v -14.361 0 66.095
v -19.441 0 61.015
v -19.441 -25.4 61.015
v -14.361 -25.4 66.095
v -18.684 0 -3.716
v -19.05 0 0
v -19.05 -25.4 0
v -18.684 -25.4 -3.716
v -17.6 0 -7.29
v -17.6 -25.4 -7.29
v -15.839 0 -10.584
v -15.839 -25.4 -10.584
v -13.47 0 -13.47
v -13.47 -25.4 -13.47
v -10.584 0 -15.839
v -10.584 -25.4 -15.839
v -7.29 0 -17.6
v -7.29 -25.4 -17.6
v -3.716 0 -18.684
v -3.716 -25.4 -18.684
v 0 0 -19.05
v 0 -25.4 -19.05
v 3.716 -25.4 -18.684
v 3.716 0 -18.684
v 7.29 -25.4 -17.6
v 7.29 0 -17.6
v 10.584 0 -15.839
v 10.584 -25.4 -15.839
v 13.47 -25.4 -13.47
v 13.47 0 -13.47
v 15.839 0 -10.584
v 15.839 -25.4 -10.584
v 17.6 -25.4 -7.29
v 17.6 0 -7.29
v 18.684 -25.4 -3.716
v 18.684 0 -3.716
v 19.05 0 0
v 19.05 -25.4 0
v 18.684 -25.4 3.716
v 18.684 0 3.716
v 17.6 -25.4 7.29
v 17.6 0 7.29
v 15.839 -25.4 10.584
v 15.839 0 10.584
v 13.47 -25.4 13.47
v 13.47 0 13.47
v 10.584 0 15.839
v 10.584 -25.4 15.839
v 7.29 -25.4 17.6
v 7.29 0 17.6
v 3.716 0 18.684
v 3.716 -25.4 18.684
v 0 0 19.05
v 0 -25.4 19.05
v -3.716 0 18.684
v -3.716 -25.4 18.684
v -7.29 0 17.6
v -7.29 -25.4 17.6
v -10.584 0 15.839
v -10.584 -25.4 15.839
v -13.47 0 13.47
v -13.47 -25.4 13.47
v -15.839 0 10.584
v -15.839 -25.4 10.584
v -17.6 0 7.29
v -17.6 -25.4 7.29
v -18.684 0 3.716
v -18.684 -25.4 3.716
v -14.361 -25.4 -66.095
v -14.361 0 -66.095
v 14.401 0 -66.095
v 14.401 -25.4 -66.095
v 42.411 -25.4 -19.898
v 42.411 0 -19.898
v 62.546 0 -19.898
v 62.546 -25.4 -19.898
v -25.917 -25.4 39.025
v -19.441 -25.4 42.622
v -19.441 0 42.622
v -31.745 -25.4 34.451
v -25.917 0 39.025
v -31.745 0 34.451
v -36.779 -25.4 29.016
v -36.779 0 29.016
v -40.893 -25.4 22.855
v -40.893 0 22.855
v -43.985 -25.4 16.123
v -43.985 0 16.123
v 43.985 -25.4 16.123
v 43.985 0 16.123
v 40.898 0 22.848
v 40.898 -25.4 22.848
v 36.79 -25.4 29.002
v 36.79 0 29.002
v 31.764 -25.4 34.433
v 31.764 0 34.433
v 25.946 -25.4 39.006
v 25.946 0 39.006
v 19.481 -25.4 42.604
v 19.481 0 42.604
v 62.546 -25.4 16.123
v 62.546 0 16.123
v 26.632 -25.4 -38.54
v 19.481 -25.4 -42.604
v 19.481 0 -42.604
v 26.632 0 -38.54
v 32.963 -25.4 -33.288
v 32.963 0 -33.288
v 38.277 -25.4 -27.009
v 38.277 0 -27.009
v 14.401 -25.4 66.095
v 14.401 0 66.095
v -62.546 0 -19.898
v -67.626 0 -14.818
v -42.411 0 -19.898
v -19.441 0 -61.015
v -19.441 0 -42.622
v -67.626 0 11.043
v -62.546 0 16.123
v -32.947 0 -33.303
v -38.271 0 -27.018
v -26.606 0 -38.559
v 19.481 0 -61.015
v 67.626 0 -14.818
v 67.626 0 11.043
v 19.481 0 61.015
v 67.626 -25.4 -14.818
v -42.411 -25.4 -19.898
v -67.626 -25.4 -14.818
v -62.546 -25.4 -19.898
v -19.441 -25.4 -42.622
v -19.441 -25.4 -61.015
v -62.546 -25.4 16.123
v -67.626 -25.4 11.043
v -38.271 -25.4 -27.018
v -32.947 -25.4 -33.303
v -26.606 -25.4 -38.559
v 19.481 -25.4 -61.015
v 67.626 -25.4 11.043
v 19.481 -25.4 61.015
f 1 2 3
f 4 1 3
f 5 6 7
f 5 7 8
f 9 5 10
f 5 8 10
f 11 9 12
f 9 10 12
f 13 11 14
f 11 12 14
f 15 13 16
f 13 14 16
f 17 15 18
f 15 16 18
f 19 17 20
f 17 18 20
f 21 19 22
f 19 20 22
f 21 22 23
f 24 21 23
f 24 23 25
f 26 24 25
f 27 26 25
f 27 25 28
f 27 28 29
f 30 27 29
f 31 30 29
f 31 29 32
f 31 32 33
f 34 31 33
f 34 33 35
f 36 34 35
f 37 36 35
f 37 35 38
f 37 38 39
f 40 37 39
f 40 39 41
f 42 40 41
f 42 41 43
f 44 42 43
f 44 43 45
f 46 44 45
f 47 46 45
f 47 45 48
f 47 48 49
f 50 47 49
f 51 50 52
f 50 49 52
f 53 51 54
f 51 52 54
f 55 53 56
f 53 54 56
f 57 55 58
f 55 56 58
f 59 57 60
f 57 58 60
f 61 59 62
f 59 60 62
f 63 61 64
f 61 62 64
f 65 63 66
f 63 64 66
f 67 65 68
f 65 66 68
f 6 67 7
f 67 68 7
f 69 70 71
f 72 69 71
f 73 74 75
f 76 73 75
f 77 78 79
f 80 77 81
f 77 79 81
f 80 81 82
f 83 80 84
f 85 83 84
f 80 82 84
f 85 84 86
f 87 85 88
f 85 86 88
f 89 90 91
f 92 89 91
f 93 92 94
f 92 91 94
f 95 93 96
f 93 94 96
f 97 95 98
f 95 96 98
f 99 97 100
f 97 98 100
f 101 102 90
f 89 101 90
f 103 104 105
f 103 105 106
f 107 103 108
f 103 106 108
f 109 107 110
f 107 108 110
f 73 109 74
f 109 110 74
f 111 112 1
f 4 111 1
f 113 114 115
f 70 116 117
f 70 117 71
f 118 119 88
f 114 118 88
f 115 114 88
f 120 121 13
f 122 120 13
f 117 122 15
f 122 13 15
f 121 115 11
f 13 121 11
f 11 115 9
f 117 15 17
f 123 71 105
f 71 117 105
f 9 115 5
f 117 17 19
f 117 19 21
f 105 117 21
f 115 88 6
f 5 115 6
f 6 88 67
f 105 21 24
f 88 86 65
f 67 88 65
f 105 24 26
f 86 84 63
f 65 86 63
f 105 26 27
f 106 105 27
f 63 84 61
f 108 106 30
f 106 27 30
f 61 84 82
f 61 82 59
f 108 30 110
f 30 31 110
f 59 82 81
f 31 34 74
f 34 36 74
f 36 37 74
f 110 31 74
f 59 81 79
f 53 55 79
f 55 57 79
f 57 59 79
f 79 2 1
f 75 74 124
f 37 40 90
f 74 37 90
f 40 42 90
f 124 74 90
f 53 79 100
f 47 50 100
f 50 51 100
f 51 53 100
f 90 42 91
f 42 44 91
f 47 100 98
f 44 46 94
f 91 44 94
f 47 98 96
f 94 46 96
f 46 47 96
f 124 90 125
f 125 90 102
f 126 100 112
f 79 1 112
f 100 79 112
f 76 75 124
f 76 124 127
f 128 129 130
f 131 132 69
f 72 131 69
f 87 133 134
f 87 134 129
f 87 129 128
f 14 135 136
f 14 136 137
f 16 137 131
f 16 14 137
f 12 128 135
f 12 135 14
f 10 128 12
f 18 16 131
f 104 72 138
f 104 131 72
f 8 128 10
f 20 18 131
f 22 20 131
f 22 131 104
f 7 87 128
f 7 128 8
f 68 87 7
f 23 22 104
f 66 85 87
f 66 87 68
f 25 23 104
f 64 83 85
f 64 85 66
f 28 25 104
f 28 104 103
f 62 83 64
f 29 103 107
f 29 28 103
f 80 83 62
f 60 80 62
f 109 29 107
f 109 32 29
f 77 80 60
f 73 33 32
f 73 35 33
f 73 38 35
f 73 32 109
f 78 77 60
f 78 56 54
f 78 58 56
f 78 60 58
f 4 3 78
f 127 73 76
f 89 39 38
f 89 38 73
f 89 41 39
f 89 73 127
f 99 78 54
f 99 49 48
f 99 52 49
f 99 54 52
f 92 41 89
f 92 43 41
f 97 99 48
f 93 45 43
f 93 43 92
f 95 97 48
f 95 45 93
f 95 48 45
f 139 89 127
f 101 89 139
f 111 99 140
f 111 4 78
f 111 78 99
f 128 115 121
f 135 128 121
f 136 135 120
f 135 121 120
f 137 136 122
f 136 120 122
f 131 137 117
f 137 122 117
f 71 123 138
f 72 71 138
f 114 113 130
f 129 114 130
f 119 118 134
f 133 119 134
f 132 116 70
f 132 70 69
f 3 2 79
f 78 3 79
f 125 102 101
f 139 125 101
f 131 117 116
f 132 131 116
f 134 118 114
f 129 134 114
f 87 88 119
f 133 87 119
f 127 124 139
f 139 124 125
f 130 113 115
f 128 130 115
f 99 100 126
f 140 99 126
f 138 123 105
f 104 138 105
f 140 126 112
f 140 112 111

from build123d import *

# Parameters (mm, degrees)
F1_DEPTH = 25.4
F3_D     = 38.1
F4_SIZE  = 5.08
F5_SIZE  = 5.08
F6_SIZE  = 5.08
F7_SIZE  = 5.08
F8_SIZE  = 5.08
F9_SIZE  = 5.08
F10_SIZE = 5.08
F11_SIZE = 5.08


with BuildPart() as f1:
    # F0 (on Front) → F1 (new body)
    with BuildSketch(Plane.XZ):
        with BuildLine():
            Line((-67.625843, -19.898139), (-42.411047, -19.898139))
            ThreePointArc((-42.411047, -19.898139), (-32.947346, -33.303232), (-19.441356, -42.622372))
            Line((-19.441356, -42.622372), (-19.441356, -66.095218))
            Line((-19.441356, -66.095218), (19.480696, -66.095218))
            Line((19.480696, -66.095218), (19.480696, -42.604406))
            ThreePointArc((19.480696, -42.604406), (32.962715, -33.28802), (42.411047, -19.898139))
            Line((42.411047, -19.898139), (67.625843, -19.898139))
            Line((67.625843, -19.898139), (67.625843, 16.122991))
            Line((67.625843, 16.122991), (43.985021, 16.122991))
            ThreePointArc((43.985021, 16.122991), (34.384453, 31.817326), (19.480696, 42.604406))
            Line((19.480696, 42.604406), (19.480696, 66.095218))
            Line((19.480696, 66.095218), (-19.441356, 66.095218))
            Line((-19.441356, 66.095218), (-19.441356, 42.622372))
            ThreePointArc((-19.441356, 42.622372), (-34.369763, 31.833195), (-43.985021, 16.122991))
            Line((-43.985021, 16.122991), (-67.625843, 16.122991))
            Line((-67.625843, 16.122991), (-67.625843, -19.898139))
        make_face()
    extrude(amount=F1_DEPTH)

    # F3 (through all)
    with Locations(Plane(origin=(0, 0, 0), x_dir=(1, 0, 0), z_dir=(0, 1, 0))):
        with Locations((0, 0)):
            Hole(F3_D / 2)

    # F4
    f4_edges = [f1.edges().sort_by_distance(p)[0] for p in [
        (19.480696, -12.7, 66.095218),
    ]]
    chamfer(f4_edges, length=F4_SIZE)

    # F5
    f5_edges = [f1.edges().sort_by_distance(p)[0] for p in [
        (-19.441356, -12.7, 66.095218),
    ]]
    chamfer(f5_edges, length=F5_SIZE)

    # F6
    f6_edges = [f1.edges().sort_by_distance(p)[0] for p in [
        (-67.625843, -12.7, 16.122991),
    ]]
    chamfer(f6_edges, length=F6_SIZE)

    # F7
    f7_edges = [f1.edges().sort_by_distance(p)[0] for p in [
        (-67.625843, -12.7, -19.898139),
    ]]
    chamfer(f7_edges, length=F7_SIZE)

    # F8
    f8_edges = [f1.edges().sort_by_distance(p)[0] for p in [
        (19.480696, -12.7, -66.095218),
    ]]
    chamfer(f8_edges, length=F8_SIZE)

    # F9
    f9_edges = [f1.edges().sort_by_distance(p)[0] for p in [
        (-19.441356, -12.7, -66.095218),
    ]]
    chamfer(f9_edges, length=F9_SIZE)

    # F10
    f10_edges = [f1.edges().sort_by_distance(p)[0] for p in [
        (67.625843, -12.7, 16.122991),
    ]]
    chamfer(f10_edges, length=F10_SIZE)

    # F11
    f11_edges = [f1.edges().sort_by_distance(p)[0] for p in [
        (67.625843, -12.7, -19.898139),
    ]]
    chamfer(f11_edges, length=F11_SIZE)


solid = f1.part
